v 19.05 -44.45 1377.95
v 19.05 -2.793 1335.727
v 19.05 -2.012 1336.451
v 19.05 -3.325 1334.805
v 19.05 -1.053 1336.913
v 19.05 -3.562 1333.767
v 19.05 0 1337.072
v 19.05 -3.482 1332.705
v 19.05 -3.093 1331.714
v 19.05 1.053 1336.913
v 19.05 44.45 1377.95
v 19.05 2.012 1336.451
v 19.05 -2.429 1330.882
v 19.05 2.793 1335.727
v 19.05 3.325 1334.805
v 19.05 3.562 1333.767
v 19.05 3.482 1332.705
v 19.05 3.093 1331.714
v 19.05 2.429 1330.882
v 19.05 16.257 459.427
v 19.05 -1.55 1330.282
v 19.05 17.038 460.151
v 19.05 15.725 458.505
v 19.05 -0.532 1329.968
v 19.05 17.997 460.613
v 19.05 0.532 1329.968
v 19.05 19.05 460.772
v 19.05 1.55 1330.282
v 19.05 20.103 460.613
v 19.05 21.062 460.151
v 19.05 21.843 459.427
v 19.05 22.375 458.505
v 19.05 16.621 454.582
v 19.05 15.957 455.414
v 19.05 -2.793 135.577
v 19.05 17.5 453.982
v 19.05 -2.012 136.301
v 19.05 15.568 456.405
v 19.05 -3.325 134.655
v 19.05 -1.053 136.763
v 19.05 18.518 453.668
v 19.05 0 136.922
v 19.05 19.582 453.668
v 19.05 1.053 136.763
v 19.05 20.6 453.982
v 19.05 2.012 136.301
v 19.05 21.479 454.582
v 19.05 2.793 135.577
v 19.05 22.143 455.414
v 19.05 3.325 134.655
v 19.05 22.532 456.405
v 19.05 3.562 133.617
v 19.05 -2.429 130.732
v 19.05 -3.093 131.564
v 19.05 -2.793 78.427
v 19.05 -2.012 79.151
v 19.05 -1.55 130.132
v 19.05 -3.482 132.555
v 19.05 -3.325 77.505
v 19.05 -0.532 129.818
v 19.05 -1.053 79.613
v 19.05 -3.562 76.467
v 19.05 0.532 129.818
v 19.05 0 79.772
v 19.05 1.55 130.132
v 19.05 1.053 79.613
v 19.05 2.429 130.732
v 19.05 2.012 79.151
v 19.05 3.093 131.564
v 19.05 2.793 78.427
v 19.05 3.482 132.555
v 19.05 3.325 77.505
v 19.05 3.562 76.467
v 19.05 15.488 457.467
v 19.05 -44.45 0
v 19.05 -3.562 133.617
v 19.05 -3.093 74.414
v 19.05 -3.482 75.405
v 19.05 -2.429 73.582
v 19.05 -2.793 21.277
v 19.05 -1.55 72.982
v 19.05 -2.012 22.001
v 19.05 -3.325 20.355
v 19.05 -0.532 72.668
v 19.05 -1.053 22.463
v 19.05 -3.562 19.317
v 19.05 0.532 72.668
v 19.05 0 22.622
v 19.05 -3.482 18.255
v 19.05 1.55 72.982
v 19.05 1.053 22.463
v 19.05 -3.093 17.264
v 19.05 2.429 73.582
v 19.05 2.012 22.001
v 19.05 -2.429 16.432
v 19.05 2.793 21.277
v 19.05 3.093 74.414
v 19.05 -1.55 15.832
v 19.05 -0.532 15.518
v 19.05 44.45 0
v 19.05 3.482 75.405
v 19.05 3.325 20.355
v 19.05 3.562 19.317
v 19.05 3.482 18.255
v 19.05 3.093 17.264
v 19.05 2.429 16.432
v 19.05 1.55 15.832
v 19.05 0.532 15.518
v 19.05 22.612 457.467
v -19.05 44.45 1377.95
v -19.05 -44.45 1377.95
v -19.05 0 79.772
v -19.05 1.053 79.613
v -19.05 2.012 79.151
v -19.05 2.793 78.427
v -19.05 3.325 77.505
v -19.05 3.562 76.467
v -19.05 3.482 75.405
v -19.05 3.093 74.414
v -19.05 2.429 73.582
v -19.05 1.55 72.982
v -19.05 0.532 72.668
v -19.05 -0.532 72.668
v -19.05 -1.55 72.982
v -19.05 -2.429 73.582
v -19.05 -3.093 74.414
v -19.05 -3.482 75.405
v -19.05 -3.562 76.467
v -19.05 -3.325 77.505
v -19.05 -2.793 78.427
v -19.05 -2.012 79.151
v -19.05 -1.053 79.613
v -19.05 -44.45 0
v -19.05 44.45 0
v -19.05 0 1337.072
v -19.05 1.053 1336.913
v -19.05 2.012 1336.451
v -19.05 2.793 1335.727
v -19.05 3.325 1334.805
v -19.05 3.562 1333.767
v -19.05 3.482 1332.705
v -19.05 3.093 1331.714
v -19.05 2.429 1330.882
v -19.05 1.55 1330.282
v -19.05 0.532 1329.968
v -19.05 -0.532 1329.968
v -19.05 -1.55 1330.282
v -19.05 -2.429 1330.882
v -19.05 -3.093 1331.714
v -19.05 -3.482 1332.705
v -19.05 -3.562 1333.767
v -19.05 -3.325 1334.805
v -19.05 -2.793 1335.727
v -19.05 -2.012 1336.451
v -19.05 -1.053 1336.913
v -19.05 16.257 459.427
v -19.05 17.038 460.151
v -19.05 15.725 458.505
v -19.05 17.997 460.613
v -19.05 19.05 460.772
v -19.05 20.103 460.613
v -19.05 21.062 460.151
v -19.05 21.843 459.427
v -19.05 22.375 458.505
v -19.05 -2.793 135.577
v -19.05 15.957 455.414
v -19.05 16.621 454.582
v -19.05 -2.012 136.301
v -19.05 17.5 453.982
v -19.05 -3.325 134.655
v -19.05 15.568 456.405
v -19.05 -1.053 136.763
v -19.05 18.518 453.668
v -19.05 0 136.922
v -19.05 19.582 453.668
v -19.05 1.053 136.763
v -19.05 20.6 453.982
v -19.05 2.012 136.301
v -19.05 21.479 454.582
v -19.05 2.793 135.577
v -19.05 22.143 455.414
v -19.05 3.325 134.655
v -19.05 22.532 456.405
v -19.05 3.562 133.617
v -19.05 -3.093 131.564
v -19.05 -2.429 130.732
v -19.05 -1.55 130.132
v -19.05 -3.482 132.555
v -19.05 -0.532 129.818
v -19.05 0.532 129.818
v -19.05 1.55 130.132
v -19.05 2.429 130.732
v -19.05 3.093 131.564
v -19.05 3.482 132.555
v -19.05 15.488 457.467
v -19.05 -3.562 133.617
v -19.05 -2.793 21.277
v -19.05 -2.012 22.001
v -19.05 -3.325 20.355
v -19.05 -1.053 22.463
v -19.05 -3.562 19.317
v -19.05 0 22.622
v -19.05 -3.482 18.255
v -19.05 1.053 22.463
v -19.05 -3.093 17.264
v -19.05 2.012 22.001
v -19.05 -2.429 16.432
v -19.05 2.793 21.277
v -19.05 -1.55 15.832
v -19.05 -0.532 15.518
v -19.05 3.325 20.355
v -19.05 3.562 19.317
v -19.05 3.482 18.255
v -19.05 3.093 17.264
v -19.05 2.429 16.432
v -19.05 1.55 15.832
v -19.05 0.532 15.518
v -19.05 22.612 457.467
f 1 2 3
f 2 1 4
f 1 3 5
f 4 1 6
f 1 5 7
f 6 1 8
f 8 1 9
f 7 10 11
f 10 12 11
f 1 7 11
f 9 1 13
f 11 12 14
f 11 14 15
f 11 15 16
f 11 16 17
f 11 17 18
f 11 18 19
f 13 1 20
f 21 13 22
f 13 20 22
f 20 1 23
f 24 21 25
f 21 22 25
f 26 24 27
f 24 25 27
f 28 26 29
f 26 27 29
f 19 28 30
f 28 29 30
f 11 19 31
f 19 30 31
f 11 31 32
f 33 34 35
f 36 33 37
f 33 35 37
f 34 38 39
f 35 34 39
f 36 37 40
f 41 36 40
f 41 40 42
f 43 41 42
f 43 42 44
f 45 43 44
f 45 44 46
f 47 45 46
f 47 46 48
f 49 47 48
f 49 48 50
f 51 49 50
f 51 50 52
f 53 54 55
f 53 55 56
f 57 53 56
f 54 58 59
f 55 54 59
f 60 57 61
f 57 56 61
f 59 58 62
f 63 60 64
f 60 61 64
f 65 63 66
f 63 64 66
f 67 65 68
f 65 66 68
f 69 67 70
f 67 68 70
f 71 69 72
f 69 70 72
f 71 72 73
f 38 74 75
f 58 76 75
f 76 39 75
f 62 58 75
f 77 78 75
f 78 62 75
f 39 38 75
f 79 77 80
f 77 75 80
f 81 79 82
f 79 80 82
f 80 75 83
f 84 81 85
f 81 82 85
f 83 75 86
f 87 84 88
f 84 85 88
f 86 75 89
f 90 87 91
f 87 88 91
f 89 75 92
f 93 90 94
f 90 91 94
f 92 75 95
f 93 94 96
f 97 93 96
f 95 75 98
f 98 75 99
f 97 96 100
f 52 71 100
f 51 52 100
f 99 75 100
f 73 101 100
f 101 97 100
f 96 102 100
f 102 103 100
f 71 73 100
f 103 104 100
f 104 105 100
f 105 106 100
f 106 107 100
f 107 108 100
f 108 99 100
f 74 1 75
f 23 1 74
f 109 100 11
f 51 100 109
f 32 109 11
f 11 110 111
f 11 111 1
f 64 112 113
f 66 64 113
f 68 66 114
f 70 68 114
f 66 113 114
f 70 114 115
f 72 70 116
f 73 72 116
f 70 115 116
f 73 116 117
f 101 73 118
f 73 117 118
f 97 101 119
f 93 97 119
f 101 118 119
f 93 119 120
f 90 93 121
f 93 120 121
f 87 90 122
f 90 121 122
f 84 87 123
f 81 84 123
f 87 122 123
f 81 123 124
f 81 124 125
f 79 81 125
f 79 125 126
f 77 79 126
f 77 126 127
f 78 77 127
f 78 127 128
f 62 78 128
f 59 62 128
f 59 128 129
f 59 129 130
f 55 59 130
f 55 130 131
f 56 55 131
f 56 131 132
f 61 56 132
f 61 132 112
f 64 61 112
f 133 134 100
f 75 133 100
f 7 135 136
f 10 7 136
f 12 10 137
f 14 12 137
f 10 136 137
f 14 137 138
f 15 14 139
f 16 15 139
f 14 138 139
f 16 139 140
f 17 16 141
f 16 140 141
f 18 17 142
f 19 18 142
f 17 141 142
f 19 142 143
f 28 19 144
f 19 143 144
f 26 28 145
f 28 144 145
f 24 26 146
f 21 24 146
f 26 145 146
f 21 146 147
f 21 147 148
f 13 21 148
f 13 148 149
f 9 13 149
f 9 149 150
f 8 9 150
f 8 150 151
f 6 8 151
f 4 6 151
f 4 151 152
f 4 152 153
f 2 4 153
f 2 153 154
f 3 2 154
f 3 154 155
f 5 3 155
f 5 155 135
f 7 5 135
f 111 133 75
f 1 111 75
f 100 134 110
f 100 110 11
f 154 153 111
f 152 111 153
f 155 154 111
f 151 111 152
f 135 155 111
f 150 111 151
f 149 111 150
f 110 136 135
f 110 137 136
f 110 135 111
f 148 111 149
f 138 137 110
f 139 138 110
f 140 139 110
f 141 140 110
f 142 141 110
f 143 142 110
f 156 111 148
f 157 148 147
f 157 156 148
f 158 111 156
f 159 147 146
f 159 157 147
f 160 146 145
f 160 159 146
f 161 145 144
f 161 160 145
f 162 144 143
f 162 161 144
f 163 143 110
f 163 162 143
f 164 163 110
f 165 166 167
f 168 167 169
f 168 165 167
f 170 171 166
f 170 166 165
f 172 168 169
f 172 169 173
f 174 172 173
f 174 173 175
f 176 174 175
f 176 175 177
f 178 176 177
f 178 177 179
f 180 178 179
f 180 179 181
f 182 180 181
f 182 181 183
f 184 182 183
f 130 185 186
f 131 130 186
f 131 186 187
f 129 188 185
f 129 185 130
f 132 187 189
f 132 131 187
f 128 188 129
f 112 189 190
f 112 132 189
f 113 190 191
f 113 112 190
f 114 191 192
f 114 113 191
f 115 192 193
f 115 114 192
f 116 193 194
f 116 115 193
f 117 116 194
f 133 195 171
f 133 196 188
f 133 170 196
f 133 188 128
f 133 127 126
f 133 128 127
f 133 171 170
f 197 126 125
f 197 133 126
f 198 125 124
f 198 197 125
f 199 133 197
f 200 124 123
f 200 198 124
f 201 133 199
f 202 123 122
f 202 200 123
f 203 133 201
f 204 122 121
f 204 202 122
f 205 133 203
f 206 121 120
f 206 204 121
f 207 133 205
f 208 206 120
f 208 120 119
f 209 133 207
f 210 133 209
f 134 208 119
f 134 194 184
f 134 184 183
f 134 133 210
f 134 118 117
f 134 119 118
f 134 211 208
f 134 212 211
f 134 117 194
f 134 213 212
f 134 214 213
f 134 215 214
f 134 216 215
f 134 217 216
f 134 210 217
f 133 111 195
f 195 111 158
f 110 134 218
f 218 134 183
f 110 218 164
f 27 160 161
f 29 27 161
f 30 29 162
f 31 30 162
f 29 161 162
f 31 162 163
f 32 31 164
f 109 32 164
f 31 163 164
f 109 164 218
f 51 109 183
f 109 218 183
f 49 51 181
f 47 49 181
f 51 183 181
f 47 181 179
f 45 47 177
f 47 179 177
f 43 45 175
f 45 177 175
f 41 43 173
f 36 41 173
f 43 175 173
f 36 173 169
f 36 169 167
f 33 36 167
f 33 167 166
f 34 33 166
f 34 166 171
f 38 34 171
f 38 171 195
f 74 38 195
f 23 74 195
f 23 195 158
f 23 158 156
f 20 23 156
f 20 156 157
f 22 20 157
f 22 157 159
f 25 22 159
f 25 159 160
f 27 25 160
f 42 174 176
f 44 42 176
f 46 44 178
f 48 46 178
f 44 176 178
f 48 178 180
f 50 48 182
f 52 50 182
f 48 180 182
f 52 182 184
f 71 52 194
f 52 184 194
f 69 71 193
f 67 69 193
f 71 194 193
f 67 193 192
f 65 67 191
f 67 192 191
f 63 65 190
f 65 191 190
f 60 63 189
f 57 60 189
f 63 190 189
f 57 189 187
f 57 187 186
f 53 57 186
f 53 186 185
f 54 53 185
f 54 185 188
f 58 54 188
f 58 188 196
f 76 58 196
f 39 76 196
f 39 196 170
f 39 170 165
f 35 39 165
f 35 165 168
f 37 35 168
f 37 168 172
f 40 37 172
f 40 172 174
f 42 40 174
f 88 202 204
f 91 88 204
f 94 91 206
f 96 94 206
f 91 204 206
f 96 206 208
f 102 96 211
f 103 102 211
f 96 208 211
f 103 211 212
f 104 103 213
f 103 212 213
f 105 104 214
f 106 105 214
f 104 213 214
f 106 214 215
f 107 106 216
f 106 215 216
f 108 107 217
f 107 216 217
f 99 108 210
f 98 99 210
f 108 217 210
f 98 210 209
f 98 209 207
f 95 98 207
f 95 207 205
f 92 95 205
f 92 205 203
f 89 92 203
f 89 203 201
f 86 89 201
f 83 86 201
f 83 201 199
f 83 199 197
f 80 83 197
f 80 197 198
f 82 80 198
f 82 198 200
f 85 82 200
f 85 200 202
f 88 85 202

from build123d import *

# Parameters (mm, degrees)
SKETCH1_W                       = 38.1
SKETCH1_H                       = 88.9
BOSS_EXTRUDE1_DEPTH             = 1377.95
F_9_32_0_28125_DIAMETER_HOLE1_D = 7.14375


with BuildPart() as part:
    # Sketch1 → Boss-Extrude1 (new body)
    with BuildSketch(Plane.XY):
        Rectangle(SKETCH1_W, SKETCH1_H)
    extrude(amount=BOSS_EXTRUDE1_DEPTH)

    # 9/32 (0.28125) Diameter Hole1 (through all)
    with Locations(Plane(origin=(19.05, 0, 0), x_dir=(0, 0, -1), z_dir=(1, 0, 0))):
        with Locations((-19.05, 0), (-76.2, 0), (-133.35, 0), (-1333.5, 0), (-457.2, 19.05)):
            Hole(F_9_32_0_28125_DIAMETER_HOLE1_D / 2)


solid = part.part
